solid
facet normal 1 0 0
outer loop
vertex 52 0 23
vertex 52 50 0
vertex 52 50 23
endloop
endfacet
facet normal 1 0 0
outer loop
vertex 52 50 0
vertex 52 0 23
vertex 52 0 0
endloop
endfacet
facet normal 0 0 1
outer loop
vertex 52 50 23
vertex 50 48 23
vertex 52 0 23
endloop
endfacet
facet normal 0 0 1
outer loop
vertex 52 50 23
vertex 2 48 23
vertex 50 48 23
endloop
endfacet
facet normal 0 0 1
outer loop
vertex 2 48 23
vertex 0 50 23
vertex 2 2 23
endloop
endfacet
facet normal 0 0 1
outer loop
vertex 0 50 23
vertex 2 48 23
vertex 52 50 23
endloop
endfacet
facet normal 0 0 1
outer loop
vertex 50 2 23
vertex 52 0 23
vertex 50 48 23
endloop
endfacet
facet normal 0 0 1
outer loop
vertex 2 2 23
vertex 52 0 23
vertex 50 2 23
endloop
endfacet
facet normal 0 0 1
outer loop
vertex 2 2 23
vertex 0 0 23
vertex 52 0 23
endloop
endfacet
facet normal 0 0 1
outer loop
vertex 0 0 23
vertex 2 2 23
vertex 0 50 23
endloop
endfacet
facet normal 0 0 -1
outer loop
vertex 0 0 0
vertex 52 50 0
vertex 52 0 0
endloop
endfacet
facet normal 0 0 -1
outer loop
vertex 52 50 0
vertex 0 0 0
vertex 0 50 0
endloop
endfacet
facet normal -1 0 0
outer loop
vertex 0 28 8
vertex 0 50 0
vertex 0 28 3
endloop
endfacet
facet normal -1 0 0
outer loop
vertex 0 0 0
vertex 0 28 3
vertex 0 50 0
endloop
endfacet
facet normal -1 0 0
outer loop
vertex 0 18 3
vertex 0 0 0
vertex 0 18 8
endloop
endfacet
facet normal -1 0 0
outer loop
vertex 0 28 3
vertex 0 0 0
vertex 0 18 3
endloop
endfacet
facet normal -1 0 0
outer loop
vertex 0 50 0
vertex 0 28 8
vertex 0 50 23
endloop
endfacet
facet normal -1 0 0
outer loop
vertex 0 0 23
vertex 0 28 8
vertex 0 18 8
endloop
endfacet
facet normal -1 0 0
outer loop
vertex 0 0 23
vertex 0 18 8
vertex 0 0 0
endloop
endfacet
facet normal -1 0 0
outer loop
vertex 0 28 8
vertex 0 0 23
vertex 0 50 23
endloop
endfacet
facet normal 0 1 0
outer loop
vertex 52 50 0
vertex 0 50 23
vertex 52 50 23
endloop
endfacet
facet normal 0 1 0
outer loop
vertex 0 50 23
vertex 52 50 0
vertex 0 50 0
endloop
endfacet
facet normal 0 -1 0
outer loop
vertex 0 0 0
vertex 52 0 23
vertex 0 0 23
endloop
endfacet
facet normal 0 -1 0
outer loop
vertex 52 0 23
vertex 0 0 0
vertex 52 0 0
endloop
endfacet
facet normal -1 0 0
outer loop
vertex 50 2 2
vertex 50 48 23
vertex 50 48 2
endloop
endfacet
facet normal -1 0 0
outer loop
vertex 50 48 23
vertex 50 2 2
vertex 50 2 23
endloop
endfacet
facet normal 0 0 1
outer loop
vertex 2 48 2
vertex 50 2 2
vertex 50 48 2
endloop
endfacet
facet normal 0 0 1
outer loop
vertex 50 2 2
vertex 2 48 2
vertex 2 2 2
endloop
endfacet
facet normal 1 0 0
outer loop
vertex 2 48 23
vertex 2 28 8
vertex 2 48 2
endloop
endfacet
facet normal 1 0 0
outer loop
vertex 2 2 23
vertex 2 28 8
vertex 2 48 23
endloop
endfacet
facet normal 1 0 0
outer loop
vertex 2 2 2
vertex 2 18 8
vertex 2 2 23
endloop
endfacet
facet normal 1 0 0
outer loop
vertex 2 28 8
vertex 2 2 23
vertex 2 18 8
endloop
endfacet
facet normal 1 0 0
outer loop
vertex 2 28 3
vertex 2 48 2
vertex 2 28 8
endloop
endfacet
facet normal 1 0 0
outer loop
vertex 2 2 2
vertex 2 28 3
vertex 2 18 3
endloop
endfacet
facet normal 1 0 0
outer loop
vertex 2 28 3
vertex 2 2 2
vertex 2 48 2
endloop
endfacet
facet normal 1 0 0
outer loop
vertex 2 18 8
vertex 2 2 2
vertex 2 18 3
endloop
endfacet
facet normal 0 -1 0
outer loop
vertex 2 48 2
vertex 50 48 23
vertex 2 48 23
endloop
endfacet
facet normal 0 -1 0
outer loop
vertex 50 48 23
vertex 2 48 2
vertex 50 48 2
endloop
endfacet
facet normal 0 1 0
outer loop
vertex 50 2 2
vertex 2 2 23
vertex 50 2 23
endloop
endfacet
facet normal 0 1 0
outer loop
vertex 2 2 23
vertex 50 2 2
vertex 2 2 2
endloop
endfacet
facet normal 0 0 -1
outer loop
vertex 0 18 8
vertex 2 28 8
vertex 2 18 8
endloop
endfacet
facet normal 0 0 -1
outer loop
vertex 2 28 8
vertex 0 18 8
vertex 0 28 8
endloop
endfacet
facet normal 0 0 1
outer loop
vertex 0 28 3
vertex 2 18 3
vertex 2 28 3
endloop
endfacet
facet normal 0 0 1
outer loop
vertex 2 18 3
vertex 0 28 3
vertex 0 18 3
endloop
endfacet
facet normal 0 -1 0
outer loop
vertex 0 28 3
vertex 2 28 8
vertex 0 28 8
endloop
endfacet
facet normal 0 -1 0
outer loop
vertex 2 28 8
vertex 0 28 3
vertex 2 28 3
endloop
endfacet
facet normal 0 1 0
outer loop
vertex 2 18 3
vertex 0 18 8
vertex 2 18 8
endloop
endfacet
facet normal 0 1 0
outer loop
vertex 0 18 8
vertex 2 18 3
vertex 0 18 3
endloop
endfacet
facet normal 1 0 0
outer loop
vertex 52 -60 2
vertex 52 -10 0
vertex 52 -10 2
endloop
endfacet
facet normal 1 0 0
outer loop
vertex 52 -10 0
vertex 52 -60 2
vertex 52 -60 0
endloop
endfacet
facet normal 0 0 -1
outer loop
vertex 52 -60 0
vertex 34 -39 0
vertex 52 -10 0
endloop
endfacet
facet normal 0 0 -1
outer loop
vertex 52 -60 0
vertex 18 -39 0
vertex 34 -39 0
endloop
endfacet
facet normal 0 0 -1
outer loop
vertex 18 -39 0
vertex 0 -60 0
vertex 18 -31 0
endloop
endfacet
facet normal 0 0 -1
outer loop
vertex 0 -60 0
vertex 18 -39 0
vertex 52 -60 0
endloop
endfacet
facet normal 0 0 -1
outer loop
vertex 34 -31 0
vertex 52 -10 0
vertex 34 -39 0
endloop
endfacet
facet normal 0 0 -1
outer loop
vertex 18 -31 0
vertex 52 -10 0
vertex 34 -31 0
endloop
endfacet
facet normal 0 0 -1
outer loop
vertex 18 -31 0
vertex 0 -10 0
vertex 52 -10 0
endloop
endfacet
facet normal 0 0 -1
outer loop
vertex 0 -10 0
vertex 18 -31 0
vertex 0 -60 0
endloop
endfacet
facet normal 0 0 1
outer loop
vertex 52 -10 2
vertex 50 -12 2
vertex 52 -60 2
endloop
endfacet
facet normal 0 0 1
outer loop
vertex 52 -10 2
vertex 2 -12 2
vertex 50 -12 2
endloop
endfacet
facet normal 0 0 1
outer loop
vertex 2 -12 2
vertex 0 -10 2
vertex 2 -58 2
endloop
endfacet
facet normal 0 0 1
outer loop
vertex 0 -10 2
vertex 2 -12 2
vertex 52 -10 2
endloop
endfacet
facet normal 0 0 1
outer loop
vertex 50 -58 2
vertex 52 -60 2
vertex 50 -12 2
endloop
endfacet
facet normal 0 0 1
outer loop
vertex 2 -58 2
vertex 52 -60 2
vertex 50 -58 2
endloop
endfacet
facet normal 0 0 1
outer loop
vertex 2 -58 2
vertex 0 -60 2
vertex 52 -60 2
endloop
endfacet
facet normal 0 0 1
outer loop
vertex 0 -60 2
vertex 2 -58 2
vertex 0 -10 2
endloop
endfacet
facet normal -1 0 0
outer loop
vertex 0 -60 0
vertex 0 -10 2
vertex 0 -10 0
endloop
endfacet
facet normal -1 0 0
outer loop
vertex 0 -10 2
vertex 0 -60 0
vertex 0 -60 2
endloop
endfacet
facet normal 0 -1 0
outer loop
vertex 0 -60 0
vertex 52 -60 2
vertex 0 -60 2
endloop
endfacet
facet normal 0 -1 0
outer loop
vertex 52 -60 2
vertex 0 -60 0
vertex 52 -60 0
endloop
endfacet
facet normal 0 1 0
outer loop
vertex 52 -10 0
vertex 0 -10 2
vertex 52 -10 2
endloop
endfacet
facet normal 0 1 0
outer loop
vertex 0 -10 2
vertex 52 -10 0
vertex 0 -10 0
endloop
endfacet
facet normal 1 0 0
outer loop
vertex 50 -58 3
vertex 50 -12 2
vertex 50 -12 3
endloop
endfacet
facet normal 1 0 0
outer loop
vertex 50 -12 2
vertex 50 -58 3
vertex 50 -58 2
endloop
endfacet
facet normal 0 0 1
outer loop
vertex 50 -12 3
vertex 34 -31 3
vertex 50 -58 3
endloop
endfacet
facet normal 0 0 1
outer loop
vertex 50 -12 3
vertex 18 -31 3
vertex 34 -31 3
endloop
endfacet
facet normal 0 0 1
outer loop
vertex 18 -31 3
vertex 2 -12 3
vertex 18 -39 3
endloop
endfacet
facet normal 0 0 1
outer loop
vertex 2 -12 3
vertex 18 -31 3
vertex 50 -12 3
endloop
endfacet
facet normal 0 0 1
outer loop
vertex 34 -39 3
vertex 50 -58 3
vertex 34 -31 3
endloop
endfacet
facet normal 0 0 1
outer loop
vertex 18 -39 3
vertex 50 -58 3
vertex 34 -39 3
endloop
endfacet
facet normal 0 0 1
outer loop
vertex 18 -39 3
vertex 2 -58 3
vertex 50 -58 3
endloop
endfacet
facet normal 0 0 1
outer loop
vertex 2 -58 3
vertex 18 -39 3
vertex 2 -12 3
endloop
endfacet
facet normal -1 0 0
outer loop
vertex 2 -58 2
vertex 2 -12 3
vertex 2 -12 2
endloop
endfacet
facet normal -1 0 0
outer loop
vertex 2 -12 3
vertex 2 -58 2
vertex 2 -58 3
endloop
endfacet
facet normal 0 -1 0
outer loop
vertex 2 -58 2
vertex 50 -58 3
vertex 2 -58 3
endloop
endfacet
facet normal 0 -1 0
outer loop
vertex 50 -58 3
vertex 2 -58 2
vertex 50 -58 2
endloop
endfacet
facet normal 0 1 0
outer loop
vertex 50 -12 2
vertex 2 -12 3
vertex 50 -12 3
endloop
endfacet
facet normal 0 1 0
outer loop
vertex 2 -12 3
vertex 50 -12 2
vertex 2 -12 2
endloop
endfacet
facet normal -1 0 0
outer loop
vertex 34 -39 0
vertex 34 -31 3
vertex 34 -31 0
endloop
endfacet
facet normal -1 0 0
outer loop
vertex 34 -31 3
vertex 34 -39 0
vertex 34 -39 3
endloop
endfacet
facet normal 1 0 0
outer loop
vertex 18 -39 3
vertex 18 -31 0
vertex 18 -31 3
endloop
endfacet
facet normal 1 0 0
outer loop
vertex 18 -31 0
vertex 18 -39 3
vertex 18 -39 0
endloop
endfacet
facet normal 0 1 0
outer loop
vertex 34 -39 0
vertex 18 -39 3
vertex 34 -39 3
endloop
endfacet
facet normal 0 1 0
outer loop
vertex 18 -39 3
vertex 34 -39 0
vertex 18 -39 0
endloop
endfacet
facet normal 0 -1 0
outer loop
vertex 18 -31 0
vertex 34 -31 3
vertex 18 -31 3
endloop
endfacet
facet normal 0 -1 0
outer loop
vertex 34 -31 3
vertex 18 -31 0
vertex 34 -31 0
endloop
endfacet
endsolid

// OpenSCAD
length = 48;
width = 46;
depth = 21;
thickness = 2;

usb_width = 10;
usb_height = 5;
usb_x = 16 + thickness;
usb_y = 1 + thickness;

hole_width = 16;
hole_length = 8;
hole_x = 16 + thickness;
hole_y = (width+2*thickness-hole_length)/2;

difference () {
	cube([length + (thickness * 2), width + (thickness * 2), depth + thickness]);
	translate([thickness, thickness, thickness])
		cube([length, width, depth + 1]);
	translate([-.5, usb_x, usb_y])
		cube([thickness + 1, usb_width, usb_height]);
}

rotate([180,0,0]) {
	translate([0,10,-thickness]) {
		difference() {
			union() {
				cube([length + (thickness *2), width + (thickness *2), thickness]);
				translate([thickness ,thickness, -thickness/2])
					cube([length, width, thickness/2]);
			}

			translate([hole_x, hole_y, -thickness*1])
				cube([hole_width, hole_length, thickness*3]);
		}
	}
}
